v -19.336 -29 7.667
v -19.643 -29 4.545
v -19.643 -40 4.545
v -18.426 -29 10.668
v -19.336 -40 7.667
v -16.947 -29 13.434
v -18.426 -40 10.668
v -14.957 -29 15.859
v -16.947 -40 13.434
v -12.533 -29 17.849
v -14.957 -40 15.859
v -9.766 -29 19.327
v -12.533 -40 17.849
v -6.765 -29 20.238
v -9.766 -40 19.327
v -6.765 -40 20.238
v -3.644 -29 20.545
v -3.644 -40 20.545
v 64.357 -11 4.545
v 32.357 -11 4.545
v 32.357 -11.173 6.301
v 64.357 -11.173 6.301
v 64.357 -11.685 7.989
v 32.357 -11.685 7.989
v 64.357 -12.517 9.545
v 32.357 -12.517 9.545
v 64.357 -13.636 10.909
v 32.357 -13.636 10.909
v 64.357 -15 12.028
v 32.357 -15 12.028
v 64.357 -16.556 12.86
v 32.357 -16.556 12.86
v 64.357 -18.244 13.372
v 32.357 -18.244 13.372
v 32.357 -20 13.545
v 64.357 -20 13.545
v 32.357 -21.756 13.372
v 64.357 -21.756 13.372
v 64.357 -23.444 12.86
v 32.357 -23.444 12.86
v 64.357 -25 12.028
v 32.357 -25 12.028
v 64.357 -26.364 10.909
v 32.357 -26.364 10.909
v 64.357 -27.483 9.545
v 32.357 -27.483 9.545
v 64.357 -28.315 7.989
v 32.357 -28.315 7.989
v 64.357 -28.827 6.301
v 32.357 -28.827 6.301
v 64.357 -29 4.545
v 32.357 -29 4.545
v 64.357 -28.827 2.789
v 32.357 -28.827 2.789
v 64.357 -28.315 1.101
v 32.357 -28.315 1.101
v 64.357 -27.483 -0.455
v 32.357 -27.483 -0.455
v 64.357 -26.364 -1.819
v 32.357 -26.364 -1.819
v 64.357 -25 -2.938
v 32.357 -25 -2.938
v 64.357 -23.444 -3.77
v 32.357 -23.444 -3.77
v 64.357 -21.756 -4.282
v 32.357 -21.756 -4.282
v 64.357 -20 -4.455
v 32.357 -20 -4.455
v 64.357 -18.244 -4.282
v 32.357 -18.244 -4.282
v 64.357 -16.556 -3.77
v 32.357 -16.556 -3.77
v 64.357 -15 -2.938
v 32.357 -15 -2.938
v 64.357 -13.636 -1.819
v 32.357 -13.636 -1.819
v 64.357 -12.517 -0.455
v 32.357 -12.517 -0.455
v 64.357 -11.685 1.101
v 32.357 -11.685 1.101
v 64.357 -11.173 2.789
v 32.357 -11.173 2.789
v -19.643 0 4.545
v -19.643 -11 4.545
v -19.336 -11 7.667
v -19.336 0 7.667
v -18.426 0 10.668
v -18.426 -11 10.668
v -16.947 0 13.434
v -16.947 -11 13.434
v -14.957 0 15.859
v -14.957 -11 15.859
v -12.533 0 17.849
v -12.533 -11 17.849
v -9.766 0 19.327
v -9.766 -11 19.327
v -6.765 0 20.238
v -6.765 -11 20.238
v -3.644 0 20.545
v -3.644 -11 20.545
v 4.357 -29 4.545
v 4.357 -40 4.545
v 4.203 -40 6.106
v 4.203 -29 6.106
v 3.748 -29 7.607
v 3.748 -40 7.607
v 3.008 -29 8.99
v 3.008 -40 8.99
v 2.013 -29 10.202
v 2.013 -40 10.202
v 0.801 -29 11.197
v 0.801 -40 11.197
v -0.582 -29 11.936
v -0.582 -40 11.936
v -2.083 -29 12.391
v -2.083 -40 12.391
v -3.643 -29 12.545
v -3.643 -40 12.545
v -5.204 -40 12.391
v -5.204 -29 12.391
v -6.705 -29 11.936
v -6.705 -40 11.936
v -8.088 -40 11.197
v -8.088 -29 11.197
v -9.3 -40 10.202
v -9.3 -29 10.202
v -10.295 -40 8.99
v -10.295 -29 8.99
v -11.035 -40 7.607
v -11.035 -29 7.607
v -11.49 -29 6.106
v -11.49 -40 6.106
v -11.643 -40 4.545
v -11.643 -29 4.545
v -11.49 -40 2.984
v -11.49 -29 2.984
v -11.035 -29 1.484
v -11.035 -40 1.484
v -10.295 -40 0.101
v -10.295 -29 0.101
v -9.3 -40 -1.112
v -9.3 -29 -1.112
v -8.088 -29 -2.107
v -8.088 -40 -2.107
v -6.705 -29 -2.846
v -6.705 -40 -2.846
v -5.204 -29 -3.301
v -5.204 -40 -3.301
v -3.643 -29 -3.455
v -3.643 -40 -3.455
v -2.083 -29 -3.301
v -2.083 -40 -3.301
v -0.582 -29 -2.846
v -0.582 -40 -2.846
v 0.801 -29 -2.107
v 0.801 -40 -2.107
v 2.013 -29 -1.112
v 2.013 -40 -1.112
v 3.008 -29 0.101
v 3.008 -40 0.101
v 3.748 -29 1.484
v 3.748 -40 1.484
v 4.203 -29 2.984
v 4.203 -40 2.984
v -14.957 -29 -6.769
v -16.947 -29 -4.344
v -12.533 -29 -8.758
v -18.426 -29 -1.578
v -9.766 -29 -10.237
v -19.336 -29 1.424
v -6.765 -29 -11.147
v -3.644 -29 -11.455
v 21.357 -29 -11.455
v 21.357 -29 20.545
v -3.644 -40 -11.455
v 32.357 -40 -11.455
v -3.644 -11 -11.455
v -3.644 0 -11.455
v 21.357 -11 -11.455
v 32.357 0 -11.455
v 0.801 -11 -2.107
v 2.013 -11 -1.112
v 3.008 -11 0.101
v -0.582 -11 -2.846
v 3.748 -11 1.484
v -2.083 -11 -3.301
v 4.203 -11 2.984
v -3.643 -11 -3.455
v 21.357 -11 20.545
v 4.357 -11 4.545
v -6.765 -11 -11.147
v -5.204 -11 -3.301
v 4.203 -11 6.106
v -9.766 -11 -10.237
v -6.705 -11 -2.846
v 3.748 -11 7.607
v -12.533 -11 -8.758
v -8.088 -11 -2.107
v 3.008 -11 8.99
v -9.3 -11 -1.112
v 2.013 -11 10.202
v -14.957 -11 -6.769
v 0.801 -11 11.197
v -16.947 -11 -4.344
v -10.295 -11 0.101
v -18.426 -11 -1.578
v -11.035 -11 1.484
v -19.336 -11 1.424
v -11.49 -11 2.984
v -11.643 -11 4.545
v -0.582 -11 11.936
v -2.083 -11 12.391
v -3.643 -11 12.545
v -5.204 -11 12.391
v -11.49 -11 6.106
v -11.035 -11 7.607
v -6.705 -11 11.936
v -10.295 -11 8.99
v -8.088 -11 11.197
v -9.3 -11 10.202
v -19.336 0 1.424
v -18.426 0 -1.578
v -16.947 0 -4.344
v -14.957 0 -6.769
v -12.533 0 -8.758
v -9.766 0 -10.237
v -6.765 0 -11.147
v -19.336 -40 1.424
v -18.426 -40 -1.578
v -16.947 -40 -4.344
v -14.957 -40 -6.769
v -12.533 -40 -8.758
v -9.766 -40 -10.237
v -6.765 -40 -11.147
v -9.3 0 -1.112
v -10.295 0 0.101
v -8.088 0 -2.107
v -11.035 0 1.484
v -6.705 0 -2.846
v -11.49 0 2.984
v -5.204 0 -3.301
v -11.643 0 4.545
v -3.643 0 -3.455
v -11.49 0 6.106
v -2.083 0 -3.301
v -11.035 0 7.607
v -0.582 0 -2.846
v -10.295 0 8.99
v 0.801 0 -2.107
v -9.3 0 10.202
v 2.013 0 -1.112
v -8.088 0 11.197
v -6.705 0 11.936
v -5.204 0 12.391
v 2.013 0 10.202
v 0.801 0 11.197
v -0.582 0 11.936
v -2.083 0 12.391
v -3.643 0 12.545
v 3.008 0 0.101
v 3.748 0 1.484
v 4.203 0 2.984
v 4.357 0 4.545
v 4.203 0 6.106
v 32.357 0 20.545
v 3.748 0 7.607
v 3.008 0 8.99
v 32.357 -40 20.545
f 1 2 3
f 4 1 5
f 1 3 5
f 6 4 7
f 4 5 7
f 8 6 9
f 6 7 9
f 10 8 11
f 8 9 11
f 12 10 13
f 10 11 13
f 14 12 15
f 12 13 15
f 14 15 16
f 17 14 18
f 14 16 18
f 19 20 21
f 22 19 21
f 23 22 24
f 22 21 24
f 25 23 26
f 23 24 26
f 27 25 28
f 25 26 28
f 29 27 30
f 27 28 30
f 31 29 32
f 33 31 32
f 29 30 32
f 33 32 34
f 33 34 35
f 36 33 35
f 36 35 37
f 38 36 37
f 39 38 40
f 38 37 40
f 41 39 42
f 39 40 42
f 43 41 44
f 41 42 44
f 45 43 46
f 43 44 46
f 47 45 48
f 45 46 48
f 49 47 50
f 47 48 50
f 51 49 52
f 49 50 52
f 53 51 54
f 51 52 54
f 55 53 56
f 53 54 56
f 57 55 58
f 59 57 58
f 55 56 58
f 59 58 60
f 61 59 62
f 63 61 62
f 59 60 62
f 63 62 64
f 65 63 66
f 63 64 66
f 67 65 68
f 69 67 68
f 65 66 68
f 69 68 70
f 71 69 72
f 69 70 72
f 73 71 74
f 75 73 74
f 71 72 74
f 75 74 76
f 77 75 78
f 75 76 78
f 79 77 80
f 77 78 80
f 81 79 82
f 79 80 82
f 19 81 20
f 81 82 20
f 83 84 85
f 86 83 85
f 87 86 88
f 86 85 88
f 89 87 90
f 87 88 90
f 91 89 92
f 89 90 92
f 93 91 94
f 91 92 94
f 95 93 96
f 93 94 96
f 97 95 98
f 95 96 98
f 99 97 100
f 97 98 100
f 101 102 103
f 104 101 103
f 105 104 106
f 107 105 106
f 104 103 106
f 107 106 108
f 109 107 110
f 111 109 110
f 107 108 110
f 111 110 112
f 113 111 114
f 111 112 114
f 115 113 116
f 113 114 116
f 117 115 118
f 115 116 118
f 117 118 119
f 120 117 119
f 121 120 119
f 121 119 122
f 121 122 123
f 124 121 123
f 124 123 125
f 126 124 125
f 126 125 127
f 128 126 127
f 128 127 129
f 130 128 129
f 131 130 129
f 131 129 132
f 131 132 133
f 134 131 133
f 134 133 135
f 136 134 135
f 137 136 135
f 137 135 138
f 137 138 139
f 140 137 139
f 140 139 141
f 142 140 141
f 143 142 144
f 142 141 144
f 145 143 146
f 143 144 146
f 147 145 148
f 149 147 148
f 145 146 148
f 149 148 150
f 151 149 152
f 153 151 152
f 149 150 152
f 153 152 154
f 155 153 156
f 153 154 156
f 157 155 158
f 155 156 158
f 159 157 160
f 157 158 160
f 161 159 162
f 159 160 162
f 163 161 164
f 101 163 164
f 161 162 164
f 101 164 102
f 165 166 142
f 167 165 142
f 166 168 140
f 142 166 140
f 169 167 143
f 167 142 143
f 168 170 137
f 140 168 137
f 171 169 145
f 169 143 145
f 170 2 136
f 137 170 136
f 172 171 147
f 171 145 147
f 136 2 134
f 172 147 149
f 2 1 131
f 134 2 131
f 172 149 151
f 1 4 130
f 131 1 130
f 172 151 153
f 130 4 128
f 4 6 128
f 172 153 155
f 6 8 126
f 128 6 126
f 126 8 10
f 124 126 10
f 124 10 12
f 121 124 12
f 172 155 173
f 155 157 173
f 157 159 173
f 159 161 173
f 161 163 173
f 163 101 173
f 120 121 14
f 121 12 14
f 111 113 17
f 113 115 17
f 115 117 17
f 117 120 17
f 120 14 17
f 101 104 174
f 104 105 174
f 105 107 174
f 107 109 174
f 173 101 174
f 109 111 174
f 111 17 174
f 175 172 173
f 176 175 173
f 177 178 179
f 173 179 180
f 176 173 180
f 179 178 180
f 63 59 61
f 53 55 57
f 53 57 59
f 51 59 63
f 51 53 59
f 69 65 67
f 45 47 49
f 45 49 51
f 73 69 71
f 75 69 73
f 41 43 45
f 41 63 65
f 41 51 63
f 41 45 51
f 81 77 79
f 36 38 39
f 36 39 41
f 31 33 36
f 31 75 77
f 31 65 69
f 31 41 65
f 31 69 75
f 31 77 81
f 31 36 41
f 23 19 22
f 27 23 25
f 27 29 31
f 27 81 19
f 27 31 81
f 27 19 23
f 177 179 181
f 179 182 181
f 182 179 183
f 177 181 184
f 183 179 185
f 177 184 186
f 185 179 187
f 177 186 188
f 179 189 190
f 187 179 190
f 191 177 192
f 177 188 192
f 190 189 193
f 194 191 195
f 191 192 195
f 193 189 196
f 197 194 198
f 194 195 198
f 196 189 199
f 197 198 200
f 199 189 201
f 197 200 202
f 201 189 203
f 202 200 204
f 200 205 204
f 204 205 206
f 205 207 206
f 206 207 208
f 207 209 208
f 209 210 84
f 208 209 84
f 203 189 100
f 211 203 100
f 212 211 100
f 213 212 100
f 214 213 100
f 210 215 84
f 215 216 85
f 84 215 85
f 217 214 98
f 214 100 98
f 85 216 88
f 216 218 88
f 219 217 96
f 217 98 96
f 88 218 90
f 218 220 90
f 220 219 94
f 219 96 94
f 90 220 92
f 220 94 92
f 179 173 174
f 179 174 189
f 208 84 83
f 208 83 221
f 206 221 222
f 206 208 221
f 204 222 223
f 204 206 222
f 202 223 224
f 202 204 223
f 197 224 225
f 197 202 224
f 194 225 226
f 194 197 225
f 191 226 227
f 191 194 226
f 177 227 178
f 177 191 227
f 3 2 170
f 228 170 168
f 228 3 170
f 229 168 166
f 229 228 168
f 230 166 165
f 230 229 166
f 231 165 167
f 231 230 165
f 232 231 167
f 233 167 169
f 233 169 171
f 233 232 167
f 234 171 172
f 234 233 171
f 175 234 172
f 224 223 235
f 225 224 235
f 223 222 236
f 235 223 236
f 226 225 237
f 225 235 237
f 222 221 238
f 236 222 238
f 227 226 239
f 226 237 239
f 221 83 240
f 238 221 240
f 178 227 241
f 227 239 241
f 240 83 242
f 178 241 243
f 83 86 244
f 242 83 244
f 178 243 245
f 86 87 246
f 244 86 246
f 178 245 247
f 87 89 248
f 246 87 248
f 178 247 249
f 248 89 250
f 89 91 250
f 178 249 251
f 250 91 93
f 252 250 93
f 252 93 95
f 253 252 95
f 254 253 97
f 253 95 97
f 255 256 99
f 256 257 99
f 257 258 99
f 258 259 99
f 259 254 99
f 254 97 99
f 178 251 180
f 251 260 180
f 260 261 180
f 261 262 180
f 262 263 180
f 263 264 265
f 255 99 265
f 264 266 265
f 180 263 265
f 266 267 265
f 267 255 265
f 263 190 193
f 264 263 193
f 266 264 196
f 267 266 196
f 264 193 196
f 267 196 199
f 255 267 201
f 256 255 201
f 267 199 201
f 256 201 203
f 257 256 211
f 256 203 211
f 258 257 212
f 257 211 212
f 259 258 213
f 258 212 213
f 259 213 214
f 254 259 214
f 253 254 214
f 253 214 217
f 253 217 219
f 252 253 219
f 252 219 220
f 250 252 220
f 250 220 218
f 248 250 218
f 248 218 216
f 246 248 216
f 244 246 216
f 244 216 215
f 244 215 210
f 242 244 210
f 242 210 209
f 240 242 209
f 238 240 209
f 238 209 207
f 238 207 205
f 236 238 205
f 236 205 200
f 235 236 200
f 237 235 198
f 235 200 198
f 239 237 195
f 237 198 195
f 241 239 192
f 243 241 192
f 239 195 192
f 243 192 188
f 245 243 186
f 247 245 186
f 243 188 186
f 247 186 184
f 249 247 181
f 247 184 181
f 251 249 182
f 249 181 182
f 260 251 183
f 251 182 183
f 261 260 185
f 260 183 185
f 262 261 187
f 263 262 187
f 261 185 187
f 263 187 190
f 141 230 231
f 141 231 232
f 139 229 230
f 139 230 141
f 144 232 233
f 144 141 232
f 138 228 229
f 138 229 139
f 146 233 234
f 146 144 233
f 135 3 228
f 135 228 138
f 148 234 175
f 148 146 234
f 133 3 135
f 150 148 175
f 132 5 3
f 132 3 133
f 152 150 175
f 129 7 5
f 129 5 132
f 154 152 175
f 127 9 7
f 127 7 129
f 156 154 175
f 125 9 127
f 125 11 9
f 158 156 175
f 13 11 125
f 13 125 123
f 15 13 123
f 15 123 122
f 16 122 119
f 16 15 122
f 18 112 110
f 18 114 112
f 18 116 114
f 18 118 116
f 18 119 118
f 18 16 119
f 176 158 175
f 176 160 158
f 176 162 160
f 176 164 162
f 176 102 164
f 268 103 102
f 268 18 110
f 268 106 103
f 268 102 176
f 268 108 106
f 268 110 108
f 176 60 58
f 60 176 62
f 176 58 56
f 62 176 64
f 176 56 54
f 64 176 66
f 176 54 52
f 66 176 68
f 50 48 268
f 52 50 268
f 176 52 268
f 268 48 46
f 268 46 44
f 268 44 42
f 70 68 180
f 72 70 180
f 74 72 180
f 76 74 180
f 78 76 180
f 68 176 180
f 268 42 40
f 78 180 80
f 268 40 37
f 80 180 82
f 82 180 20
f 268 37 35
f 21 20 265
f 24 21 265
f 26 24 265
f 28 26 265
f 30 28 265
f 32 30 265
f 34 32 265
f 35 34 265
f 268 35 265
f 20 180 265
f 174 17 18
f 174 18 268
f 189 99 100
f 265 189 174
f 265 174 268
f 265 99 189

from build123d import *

# Parameters (mm, degrees)
F0_W     = 52
F0_H     = 32
F1_DEPTH = 40
F2_R     = 15.99999
F3_R     = 8
F4_DEPTH = 40.001
F5_W     = 26.99999
F5_H     = 18
F5_W_2   = 25.00001
F6_DEPTH = 32.001
F7_R     = 9
F8_DEPTH = 32


# Not quite as in the source:
# - a fillet or chamfer is up to 0.001 mm smaller than in the source, because OpenCascade refuses the exact size


with BuildPart() as f1:
    # F0 (on Front) → F1 (new body)
    with BuildSketch(Plane.XZ):
        with Locations((6.3565019518, 4.5450745088)):
            Rectangle(F0_W, F0_H)
    extrude(amount=F1_DEPTH)

    # F2 (radius 16 in the source; OpenCascade refuses exactly that, so slightly less here)
    f2_edges = [f1.edges().sort_by_distance(p)[0] for p in [
        (-19.643498, -20, 20.545075),
        (-19.643498, -20, -11.454925),
    ]]
    fillet(f2_edges, radius=F2_R)

    # F3 (on face) → F4 (cut, through all)
    with BuildSketch(Plane.XZ.offset(40)):
        with Locations((-3.6434980482, 4.5450745088)):
            Circle(F3_R)
    extrude(amount=-F4_DEPTH, mode=Mode.SUBTRACT)

    # F5 (on face) → F6 (cut, through all)
    with BuildSketch(Plane.XY.offset(20.5450745088)):
        with Locations((-17.1435030482, -20)):
            Rectangle(F5_W, F5_H)
        with Locations((8.8564969518, -20)):
            Rectangle(F5_W_2, F5_H)
    extrude(amount=-F6_DEPTH, mode=Mode.SUBTRACT)

    # F7 (on face) → F8 (join)
    with BuildSketch(Plane.YZ.offset(32.3565019518)):
        with Locations((-20, 4.5450745088)):
            Circle(F7_R)
    extrude(amount=F8_DEPTH)


solid = f1.part
